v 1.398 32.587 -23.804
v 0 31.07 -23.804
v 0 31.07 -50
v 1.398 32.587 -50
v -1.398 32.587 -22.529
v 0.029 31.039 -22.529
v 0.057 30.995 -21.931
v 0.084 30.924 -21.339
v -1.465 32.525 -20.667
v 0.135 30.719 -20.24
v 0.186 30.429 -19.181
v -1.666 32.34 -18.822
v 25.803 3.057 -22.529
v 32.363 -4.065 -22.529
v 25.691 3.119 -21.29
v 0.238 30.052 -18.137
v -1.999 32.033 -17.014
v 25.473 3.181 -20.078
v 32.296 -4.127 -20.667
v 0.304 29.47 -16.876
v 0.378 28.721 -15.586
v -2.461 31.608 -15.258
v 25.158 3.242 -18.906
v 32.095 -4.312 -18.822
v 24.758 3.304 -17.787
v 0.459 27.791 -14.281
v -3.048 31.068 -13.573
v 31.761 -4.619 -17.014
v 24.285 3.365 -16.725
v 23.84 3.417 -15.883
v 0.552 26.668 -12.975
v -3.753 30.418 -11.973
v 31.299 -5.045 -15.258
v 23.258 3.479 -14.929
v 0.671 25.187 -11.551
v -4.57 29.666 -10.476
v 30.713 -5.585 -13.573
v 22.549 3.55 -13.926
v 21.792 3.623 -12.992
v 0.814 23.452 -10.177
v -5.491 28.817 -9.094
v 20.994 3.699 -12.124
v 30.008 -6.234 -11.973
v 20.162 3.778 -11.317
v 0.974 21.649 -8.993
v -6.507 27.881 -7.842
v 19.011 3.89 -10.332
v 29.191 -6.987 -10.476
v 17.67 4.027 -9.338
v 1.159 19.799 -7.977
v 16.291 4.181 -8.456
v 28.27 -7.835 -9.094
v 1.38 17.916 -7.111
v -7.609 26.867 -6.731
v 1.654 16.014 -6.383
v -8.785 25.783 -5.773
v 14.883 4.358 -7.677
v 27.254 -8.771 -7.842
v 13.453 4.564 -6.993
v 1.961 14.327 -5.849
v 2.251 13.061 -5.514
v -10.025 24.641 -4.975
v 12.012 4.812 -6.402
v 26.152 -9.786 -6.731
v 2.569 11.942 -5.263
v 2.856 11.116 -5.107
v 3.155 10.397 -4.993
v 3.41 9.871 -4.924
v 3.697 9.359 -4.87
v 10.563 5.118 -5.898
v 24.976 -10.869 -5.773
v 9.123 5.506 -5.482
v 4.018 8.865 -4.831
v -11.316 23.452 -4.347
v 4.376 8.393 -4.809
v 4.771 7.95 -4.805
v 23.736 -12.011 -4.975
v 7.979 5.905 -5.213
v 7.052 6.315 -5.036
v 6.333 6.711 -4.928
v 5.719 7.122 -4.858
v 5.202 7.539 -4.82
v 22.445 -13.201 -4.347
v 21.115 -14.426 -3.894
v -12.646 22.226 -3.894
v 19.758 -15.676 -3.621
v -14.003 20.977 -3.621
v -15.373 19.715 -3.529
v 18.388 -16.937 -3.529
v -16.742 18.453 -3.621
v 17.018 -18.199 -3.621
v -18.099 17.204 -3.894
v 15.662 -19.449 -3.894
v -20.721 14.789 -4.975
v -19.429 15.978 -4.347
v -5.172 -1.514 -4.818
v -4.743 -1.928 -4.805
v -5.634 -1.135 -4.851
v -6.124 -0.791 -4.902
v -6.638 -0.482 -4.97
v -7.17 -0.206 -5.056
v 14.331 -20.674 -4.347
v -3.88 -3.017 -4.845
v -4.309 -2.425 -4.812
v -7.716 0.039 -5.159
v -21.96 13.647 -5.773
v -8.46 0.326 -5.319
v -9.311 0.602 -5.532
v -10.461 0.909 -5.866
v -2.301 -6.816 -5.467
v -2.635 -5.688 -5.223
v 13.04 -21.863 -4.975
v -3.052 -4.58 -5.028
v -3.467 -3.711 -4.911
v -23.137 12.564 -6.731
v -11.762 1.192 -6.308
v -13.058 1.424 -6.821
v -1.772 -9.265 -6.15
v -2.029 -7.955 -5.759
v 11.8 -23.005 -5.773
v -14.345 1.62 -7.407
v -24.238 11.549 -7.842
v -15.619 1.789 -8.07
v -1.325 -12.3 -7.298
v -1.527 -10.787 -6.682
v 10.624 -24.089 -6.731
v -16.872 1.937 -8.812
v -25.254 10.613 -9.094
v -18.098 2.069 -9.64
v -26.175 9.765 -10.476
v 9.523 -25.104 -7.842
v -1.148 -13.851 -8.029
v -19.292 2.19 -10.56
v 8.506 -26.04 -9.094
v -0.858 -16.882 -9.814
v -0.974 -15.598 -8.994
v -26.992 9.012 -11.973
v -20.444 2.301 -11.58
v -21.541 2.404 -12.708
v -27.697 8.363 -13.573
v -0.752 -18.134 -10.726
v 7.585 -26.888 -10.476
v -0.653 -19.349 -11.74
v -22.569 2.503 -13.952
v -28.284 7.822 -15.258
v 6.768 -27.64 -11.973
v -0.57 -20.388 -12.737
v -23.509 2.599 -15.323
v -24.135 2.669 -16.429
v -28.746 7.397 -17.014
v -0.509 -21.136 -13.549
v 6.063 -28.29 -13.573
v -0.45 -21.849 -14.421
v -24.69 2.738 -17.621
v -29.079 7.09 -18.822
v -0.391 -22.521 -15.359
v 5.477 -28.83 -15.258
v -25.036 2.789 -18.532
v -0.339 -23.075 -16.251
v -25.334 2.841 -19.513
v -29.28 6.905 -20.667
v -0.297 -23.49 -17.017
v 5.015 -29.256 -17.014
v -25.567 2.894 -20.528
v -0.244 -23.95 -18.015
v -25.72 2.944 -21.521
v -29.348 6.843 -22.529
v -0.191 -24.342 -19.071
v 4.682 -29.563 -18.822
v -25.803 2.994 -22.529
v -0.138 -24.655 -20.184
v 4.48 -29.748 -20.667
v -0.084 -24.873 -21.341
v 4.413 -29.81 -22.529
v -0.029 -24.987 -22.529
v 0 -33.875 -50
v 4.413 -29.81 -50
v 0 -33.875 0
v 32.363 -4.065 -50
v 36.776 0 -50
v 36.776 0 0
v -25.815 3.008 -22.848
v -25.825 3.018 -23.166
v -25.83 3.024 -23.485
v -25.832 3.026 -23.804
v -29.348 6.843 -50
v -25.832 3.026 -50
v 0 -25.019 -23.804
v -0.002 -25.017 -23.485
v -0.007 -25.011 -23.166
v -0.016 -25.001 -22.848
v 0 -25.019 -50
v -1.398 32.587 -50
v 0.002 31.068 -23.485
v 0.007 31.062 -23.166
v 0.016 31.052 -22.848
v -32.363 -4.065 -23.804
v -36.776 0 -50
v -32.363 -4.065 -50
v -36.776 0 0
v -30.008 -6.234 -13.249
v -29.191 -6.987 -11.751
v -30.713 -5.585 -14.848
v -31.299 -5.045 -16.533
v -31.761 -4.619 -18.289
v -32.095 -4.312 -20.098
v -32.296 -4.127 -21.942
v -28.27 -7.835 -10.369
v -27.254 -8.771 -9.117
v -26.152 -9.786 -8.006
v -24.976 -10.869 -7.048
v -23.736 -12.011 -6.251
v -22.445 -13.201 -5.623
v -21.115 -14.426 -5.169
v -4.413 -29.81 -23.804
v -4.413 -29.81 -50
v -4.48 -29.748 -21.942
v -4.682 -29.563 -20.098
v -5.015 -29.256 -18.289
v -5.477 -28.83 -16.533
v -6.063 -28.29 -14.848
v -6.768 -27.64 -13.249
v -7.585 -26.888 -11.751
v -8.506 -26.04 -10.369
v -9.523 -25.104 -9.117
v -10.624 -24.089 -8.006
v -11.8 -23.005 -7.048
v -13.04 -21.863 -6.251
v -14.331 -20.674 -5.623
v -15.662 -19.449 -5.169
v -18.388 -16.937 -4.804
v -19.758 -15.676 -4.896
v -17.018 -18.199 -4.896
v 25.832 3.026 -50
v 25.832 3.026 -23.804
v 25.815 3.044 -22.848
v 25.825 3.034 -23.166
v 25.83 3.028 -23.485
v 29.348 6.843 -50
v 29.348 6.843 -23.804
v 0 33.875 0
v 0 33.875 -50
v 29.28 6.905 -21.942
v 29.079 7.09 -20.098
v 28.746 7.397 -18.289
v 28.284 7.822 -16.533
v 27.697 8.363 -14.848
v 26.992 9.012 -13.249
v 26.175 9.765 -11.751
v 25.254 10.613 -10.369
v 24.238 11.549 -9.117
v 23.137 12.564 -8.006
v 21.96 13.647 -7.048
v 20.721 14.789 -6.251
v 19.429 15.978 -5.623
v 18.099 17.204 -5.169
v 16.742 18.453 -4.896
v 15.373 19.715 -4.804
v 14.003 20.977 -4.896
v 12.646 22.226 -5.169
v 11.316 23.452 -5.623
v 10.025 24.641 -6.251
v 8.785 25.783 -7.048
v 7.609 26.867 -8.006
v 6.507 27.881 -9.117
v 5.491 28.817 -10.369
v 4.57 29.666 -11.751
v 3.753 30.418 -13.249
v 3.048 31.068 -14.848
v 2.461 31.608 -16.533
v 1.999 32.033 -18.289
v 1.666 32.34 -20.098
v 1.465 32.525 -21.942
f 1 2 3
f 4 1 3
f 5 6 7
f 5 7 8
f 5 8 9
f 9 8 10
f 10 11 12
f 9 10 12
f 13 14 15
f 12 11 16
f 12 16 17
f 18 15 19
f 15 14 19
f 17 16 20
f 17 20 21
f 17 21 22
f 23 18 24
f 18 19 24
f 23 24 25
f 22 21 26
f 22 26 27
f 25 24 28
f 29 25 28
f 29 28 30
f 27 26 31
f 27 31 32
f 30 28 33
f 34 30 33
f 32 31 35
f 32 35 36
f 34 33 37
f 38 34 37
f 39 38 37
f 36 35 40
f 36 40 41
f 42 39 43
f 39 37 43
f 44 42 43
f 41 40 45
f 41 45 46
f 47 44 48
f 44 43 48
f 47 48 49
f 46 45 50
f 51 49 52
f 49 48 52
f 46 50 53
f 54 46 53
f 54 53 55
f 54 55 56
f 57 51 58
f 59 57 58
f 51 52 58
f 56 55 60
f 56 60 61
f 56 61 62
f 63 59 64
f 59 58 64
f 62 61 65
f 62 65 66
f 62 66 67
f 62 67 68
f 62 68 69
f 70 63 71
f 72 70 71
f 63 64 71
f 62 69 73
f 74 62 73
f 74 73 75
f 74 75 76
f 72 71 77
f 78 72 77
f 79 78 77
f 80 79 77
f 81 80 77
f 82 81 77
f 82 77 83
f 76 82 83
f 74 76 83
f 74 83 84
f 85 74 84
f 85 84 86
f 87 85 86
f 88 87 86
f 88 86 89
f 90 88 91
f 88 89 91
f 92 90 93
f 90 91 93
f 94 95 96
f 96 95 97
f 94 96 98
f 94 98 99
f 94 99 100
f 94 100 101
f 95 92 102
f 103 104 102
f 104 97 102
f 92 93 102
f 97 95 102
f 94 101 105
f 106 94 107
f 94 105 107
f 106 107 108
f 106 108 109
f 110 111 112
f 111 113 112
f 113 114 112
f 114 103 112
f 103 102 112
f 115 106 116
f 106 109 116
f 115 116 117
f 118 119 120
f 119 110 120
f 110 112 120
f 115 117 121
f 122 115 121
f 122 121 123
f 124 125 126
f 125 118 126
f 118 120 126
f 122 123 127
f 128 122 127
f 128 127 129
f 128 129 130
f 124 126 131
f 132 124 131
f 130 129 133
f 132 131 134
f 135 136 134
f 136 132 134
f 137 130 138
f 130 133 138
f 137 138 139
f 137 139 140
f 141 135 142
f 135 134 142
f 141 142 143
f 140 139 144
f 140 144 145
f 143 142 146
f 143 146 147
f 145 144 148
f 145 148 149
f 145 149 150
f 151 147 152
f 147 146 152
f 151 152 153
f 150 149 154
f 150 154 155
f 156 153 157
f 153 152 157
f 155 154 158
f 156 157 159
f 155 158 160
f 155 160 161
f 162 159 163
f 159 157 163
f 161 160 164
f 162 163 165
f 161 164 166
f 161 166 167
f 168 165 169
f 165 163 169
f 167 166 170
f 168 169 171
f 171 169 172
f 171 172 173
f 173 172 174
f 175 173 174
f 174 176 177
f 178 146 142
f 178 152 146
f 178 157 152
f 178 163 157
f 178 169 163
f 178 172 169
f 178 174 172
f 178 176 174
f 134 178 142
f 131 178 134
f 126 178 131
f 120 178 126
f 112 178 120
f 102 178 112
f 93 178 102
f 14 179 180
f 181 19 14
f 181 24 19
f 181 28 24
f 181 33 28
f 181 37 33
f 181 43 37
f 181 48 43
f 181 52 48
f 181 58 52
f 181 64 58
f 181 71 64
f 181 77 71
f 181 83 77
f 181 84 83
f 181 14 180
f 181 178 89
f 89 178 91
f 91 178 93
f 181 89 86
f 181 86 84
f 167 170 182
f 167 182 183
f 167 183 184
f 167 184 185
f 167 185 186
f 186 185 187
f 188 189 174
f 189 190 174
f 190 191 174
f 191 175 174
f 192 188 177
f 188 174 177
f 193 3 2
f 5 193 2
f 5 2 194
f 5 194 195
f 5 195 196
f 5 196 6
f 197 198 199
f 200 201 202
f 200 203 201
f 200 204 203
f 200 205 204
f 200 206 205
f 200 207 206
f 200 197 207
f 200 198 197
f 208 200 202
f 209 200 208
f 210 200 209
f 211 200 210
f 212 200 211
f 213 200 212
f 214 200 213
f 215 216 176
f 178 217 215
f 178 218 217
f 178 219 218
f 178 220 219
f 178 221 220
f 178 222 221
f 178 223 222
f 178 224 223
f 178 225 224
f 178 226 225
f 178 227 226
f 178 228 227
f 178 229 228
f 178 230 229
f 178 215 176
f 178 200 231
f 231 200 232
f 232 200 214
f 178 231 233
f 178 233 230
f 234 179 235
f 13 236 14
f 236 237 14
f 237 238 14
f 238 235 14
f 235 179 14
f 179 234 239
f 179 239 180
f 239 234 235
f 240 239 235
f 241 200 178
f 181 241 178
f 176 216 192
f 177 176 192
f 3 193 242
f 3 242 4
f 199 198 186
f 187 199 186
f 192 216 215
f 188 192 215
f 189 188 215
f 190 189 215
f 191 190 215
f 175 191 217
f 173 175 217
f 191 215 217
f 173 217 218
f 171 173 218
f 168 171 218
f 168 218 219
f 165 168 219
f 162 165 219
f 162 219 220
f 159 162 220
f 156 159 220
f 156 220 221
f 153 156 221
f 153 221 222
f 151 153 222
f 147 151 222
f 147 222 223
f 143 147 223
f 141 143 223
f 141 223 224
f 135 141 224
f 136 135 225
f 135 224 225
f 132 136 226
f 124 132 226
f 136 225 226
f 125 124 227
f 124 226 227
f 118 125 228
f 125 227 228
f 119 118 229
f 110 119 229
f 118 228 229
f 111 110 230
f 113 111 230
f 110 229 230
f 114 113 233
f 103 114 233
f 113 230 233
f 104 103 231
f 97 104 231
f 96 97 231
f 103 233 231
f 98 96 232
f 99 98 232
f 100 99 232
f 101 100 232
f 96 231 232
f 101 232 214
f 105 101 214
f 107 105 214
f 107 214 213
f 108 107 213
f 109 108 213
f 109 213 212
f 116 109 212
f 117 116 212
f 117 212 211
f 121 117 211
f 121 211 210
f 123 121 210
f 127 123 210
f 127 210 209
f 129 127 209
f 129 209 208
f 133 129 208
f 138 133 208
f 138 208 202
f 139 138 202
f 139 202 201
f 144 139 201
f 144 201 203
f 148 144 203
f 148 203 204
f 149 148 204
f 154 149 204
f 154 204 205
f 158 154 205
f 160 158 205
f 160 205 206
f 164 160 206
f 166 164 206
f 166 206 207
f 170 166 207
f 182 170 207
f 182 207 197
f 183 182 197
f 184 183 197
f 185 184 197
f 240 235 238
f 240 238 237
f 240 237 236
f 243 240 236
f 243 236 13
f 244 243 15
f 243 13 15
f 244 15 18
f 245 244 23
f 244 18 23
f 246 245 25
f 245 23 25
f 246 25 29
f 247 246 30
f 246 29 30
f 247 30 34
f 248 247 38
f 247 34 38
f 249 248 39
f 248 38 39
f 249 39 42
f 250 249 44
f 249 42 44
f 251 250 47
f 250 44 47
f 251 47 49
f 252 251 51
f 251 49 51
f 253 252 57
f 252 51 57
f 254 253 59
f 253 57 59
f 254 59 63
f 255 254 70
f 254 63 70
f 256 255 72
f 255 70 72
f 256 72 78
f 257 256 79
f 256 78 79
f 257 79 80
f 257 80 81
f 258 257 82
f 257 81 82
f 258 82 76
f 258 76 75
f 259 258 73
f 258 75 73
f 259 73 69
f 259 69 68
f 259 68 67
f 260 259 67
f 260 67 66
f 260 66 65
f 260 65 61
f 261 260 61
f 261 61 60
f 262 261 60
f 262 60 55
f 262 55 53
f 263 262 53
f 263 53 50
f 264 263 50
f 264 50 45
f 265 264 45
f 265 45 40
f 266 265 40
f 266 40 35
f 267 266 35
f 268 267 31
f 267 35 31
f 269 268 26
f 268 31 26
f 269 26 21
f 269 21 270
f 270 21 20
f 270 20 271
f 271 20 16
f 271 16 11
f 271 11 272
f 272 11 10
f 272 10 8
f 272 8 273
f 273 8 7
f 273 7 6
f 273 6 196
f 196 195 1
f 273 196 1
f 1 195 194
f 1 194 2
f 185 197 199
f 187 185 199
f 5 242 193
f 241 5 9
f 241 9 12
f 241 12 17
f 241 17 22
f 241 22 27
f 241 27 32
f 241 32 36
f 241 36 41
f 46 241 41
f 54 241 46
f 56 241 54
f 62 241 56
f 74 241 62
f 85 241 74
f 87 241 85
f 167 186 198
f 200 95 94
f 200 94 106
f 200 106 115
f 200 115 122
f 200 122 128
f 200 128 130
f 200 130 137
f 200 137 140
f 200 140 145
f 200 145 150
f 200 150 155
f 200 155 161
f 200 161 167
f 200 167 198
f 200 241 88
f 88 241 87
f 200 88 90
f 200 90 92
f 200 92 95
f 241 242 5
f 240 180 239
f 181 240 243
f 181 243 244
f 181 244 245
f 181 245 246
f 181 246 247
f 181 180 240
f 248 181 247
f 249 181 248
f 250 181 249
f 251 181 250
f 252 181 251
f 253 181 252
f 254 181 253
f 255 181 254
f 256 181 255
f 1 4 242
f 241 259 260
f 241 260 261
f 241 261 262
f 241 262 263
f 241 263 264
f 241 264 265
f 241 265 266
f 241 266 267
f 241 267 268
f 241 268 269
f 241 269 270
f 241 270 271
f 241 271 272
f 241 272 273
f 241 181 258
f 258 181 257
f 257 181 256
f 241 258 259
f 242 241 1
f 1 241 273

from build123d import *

# Parameters (mm, degrees)
F1_DEPTH = 50
F3_DEPTH = 50
F5_DEPTH = 74.7484416821


with BuildPart() as f1:
    # F0 (on Top) → F1 (new body)
    with BuildSketch(Plane.XY):
        Polygon((36.7763043397, 0), (0, 33.874820134), (-36.7763043397, 0), (0, -33.874820134), align=None)
    extrude(amount=-F1_DEPTH)

    # F2 (on face) → F3 (cut)
    with BuildSketch(Plane(origin=(-16.8803742831, -18.3262310928, 0), x_dir=(0.7355260868, -0.6774964027, 0), z_dir=(-0.6774964027, -0.7355260868, 0))):
        with BuildLine():
            Line((-21.0499312177, -23.8044057041), (-21.0499312177, -50))
            Line((-21.0499312177, -50), (16.9500687823, -50))
            Line((16.9500687823, -50), (16.9500687823, -23.8044057041))
            ThreePointArc((16.9500687823, -23.8044057041), (-2.0499312177, -4.8044057041), (-21.0499312177, -23.8044057041))
        make_face()
    extrude(amount=-F3_DEPTH, mode=Mode.SUBTRACT)

    # F4 (on face) → F5 (cut, through all)
    with BuildSketch(Plane(origin=(16.8803742831, -18.3262310928, 0), x_dir=(0.7355260868, 0.6774964027, 0), z_dir=(0.6774964027, -0.7355260868, 0))):
        with BuildLine():
            Line((-16.9500687823, -22.5290991366), (-16.9500687823, -50))
            Line((-16.9500687823, -50), (21.0499312177, -50))
            Line((21.0499312177, -50), (21.0499312177, -22.5290991366))
            ThreePointArc((21.0499312177, -22.5290991366), (2.0499312177, -3.5290991366), (-16.9500687823, -22.5290991366))
        make_face()
    extrude(amount=-F5_DEPTH, mode=Mode.SUBTRACT)


solid = f1.part
